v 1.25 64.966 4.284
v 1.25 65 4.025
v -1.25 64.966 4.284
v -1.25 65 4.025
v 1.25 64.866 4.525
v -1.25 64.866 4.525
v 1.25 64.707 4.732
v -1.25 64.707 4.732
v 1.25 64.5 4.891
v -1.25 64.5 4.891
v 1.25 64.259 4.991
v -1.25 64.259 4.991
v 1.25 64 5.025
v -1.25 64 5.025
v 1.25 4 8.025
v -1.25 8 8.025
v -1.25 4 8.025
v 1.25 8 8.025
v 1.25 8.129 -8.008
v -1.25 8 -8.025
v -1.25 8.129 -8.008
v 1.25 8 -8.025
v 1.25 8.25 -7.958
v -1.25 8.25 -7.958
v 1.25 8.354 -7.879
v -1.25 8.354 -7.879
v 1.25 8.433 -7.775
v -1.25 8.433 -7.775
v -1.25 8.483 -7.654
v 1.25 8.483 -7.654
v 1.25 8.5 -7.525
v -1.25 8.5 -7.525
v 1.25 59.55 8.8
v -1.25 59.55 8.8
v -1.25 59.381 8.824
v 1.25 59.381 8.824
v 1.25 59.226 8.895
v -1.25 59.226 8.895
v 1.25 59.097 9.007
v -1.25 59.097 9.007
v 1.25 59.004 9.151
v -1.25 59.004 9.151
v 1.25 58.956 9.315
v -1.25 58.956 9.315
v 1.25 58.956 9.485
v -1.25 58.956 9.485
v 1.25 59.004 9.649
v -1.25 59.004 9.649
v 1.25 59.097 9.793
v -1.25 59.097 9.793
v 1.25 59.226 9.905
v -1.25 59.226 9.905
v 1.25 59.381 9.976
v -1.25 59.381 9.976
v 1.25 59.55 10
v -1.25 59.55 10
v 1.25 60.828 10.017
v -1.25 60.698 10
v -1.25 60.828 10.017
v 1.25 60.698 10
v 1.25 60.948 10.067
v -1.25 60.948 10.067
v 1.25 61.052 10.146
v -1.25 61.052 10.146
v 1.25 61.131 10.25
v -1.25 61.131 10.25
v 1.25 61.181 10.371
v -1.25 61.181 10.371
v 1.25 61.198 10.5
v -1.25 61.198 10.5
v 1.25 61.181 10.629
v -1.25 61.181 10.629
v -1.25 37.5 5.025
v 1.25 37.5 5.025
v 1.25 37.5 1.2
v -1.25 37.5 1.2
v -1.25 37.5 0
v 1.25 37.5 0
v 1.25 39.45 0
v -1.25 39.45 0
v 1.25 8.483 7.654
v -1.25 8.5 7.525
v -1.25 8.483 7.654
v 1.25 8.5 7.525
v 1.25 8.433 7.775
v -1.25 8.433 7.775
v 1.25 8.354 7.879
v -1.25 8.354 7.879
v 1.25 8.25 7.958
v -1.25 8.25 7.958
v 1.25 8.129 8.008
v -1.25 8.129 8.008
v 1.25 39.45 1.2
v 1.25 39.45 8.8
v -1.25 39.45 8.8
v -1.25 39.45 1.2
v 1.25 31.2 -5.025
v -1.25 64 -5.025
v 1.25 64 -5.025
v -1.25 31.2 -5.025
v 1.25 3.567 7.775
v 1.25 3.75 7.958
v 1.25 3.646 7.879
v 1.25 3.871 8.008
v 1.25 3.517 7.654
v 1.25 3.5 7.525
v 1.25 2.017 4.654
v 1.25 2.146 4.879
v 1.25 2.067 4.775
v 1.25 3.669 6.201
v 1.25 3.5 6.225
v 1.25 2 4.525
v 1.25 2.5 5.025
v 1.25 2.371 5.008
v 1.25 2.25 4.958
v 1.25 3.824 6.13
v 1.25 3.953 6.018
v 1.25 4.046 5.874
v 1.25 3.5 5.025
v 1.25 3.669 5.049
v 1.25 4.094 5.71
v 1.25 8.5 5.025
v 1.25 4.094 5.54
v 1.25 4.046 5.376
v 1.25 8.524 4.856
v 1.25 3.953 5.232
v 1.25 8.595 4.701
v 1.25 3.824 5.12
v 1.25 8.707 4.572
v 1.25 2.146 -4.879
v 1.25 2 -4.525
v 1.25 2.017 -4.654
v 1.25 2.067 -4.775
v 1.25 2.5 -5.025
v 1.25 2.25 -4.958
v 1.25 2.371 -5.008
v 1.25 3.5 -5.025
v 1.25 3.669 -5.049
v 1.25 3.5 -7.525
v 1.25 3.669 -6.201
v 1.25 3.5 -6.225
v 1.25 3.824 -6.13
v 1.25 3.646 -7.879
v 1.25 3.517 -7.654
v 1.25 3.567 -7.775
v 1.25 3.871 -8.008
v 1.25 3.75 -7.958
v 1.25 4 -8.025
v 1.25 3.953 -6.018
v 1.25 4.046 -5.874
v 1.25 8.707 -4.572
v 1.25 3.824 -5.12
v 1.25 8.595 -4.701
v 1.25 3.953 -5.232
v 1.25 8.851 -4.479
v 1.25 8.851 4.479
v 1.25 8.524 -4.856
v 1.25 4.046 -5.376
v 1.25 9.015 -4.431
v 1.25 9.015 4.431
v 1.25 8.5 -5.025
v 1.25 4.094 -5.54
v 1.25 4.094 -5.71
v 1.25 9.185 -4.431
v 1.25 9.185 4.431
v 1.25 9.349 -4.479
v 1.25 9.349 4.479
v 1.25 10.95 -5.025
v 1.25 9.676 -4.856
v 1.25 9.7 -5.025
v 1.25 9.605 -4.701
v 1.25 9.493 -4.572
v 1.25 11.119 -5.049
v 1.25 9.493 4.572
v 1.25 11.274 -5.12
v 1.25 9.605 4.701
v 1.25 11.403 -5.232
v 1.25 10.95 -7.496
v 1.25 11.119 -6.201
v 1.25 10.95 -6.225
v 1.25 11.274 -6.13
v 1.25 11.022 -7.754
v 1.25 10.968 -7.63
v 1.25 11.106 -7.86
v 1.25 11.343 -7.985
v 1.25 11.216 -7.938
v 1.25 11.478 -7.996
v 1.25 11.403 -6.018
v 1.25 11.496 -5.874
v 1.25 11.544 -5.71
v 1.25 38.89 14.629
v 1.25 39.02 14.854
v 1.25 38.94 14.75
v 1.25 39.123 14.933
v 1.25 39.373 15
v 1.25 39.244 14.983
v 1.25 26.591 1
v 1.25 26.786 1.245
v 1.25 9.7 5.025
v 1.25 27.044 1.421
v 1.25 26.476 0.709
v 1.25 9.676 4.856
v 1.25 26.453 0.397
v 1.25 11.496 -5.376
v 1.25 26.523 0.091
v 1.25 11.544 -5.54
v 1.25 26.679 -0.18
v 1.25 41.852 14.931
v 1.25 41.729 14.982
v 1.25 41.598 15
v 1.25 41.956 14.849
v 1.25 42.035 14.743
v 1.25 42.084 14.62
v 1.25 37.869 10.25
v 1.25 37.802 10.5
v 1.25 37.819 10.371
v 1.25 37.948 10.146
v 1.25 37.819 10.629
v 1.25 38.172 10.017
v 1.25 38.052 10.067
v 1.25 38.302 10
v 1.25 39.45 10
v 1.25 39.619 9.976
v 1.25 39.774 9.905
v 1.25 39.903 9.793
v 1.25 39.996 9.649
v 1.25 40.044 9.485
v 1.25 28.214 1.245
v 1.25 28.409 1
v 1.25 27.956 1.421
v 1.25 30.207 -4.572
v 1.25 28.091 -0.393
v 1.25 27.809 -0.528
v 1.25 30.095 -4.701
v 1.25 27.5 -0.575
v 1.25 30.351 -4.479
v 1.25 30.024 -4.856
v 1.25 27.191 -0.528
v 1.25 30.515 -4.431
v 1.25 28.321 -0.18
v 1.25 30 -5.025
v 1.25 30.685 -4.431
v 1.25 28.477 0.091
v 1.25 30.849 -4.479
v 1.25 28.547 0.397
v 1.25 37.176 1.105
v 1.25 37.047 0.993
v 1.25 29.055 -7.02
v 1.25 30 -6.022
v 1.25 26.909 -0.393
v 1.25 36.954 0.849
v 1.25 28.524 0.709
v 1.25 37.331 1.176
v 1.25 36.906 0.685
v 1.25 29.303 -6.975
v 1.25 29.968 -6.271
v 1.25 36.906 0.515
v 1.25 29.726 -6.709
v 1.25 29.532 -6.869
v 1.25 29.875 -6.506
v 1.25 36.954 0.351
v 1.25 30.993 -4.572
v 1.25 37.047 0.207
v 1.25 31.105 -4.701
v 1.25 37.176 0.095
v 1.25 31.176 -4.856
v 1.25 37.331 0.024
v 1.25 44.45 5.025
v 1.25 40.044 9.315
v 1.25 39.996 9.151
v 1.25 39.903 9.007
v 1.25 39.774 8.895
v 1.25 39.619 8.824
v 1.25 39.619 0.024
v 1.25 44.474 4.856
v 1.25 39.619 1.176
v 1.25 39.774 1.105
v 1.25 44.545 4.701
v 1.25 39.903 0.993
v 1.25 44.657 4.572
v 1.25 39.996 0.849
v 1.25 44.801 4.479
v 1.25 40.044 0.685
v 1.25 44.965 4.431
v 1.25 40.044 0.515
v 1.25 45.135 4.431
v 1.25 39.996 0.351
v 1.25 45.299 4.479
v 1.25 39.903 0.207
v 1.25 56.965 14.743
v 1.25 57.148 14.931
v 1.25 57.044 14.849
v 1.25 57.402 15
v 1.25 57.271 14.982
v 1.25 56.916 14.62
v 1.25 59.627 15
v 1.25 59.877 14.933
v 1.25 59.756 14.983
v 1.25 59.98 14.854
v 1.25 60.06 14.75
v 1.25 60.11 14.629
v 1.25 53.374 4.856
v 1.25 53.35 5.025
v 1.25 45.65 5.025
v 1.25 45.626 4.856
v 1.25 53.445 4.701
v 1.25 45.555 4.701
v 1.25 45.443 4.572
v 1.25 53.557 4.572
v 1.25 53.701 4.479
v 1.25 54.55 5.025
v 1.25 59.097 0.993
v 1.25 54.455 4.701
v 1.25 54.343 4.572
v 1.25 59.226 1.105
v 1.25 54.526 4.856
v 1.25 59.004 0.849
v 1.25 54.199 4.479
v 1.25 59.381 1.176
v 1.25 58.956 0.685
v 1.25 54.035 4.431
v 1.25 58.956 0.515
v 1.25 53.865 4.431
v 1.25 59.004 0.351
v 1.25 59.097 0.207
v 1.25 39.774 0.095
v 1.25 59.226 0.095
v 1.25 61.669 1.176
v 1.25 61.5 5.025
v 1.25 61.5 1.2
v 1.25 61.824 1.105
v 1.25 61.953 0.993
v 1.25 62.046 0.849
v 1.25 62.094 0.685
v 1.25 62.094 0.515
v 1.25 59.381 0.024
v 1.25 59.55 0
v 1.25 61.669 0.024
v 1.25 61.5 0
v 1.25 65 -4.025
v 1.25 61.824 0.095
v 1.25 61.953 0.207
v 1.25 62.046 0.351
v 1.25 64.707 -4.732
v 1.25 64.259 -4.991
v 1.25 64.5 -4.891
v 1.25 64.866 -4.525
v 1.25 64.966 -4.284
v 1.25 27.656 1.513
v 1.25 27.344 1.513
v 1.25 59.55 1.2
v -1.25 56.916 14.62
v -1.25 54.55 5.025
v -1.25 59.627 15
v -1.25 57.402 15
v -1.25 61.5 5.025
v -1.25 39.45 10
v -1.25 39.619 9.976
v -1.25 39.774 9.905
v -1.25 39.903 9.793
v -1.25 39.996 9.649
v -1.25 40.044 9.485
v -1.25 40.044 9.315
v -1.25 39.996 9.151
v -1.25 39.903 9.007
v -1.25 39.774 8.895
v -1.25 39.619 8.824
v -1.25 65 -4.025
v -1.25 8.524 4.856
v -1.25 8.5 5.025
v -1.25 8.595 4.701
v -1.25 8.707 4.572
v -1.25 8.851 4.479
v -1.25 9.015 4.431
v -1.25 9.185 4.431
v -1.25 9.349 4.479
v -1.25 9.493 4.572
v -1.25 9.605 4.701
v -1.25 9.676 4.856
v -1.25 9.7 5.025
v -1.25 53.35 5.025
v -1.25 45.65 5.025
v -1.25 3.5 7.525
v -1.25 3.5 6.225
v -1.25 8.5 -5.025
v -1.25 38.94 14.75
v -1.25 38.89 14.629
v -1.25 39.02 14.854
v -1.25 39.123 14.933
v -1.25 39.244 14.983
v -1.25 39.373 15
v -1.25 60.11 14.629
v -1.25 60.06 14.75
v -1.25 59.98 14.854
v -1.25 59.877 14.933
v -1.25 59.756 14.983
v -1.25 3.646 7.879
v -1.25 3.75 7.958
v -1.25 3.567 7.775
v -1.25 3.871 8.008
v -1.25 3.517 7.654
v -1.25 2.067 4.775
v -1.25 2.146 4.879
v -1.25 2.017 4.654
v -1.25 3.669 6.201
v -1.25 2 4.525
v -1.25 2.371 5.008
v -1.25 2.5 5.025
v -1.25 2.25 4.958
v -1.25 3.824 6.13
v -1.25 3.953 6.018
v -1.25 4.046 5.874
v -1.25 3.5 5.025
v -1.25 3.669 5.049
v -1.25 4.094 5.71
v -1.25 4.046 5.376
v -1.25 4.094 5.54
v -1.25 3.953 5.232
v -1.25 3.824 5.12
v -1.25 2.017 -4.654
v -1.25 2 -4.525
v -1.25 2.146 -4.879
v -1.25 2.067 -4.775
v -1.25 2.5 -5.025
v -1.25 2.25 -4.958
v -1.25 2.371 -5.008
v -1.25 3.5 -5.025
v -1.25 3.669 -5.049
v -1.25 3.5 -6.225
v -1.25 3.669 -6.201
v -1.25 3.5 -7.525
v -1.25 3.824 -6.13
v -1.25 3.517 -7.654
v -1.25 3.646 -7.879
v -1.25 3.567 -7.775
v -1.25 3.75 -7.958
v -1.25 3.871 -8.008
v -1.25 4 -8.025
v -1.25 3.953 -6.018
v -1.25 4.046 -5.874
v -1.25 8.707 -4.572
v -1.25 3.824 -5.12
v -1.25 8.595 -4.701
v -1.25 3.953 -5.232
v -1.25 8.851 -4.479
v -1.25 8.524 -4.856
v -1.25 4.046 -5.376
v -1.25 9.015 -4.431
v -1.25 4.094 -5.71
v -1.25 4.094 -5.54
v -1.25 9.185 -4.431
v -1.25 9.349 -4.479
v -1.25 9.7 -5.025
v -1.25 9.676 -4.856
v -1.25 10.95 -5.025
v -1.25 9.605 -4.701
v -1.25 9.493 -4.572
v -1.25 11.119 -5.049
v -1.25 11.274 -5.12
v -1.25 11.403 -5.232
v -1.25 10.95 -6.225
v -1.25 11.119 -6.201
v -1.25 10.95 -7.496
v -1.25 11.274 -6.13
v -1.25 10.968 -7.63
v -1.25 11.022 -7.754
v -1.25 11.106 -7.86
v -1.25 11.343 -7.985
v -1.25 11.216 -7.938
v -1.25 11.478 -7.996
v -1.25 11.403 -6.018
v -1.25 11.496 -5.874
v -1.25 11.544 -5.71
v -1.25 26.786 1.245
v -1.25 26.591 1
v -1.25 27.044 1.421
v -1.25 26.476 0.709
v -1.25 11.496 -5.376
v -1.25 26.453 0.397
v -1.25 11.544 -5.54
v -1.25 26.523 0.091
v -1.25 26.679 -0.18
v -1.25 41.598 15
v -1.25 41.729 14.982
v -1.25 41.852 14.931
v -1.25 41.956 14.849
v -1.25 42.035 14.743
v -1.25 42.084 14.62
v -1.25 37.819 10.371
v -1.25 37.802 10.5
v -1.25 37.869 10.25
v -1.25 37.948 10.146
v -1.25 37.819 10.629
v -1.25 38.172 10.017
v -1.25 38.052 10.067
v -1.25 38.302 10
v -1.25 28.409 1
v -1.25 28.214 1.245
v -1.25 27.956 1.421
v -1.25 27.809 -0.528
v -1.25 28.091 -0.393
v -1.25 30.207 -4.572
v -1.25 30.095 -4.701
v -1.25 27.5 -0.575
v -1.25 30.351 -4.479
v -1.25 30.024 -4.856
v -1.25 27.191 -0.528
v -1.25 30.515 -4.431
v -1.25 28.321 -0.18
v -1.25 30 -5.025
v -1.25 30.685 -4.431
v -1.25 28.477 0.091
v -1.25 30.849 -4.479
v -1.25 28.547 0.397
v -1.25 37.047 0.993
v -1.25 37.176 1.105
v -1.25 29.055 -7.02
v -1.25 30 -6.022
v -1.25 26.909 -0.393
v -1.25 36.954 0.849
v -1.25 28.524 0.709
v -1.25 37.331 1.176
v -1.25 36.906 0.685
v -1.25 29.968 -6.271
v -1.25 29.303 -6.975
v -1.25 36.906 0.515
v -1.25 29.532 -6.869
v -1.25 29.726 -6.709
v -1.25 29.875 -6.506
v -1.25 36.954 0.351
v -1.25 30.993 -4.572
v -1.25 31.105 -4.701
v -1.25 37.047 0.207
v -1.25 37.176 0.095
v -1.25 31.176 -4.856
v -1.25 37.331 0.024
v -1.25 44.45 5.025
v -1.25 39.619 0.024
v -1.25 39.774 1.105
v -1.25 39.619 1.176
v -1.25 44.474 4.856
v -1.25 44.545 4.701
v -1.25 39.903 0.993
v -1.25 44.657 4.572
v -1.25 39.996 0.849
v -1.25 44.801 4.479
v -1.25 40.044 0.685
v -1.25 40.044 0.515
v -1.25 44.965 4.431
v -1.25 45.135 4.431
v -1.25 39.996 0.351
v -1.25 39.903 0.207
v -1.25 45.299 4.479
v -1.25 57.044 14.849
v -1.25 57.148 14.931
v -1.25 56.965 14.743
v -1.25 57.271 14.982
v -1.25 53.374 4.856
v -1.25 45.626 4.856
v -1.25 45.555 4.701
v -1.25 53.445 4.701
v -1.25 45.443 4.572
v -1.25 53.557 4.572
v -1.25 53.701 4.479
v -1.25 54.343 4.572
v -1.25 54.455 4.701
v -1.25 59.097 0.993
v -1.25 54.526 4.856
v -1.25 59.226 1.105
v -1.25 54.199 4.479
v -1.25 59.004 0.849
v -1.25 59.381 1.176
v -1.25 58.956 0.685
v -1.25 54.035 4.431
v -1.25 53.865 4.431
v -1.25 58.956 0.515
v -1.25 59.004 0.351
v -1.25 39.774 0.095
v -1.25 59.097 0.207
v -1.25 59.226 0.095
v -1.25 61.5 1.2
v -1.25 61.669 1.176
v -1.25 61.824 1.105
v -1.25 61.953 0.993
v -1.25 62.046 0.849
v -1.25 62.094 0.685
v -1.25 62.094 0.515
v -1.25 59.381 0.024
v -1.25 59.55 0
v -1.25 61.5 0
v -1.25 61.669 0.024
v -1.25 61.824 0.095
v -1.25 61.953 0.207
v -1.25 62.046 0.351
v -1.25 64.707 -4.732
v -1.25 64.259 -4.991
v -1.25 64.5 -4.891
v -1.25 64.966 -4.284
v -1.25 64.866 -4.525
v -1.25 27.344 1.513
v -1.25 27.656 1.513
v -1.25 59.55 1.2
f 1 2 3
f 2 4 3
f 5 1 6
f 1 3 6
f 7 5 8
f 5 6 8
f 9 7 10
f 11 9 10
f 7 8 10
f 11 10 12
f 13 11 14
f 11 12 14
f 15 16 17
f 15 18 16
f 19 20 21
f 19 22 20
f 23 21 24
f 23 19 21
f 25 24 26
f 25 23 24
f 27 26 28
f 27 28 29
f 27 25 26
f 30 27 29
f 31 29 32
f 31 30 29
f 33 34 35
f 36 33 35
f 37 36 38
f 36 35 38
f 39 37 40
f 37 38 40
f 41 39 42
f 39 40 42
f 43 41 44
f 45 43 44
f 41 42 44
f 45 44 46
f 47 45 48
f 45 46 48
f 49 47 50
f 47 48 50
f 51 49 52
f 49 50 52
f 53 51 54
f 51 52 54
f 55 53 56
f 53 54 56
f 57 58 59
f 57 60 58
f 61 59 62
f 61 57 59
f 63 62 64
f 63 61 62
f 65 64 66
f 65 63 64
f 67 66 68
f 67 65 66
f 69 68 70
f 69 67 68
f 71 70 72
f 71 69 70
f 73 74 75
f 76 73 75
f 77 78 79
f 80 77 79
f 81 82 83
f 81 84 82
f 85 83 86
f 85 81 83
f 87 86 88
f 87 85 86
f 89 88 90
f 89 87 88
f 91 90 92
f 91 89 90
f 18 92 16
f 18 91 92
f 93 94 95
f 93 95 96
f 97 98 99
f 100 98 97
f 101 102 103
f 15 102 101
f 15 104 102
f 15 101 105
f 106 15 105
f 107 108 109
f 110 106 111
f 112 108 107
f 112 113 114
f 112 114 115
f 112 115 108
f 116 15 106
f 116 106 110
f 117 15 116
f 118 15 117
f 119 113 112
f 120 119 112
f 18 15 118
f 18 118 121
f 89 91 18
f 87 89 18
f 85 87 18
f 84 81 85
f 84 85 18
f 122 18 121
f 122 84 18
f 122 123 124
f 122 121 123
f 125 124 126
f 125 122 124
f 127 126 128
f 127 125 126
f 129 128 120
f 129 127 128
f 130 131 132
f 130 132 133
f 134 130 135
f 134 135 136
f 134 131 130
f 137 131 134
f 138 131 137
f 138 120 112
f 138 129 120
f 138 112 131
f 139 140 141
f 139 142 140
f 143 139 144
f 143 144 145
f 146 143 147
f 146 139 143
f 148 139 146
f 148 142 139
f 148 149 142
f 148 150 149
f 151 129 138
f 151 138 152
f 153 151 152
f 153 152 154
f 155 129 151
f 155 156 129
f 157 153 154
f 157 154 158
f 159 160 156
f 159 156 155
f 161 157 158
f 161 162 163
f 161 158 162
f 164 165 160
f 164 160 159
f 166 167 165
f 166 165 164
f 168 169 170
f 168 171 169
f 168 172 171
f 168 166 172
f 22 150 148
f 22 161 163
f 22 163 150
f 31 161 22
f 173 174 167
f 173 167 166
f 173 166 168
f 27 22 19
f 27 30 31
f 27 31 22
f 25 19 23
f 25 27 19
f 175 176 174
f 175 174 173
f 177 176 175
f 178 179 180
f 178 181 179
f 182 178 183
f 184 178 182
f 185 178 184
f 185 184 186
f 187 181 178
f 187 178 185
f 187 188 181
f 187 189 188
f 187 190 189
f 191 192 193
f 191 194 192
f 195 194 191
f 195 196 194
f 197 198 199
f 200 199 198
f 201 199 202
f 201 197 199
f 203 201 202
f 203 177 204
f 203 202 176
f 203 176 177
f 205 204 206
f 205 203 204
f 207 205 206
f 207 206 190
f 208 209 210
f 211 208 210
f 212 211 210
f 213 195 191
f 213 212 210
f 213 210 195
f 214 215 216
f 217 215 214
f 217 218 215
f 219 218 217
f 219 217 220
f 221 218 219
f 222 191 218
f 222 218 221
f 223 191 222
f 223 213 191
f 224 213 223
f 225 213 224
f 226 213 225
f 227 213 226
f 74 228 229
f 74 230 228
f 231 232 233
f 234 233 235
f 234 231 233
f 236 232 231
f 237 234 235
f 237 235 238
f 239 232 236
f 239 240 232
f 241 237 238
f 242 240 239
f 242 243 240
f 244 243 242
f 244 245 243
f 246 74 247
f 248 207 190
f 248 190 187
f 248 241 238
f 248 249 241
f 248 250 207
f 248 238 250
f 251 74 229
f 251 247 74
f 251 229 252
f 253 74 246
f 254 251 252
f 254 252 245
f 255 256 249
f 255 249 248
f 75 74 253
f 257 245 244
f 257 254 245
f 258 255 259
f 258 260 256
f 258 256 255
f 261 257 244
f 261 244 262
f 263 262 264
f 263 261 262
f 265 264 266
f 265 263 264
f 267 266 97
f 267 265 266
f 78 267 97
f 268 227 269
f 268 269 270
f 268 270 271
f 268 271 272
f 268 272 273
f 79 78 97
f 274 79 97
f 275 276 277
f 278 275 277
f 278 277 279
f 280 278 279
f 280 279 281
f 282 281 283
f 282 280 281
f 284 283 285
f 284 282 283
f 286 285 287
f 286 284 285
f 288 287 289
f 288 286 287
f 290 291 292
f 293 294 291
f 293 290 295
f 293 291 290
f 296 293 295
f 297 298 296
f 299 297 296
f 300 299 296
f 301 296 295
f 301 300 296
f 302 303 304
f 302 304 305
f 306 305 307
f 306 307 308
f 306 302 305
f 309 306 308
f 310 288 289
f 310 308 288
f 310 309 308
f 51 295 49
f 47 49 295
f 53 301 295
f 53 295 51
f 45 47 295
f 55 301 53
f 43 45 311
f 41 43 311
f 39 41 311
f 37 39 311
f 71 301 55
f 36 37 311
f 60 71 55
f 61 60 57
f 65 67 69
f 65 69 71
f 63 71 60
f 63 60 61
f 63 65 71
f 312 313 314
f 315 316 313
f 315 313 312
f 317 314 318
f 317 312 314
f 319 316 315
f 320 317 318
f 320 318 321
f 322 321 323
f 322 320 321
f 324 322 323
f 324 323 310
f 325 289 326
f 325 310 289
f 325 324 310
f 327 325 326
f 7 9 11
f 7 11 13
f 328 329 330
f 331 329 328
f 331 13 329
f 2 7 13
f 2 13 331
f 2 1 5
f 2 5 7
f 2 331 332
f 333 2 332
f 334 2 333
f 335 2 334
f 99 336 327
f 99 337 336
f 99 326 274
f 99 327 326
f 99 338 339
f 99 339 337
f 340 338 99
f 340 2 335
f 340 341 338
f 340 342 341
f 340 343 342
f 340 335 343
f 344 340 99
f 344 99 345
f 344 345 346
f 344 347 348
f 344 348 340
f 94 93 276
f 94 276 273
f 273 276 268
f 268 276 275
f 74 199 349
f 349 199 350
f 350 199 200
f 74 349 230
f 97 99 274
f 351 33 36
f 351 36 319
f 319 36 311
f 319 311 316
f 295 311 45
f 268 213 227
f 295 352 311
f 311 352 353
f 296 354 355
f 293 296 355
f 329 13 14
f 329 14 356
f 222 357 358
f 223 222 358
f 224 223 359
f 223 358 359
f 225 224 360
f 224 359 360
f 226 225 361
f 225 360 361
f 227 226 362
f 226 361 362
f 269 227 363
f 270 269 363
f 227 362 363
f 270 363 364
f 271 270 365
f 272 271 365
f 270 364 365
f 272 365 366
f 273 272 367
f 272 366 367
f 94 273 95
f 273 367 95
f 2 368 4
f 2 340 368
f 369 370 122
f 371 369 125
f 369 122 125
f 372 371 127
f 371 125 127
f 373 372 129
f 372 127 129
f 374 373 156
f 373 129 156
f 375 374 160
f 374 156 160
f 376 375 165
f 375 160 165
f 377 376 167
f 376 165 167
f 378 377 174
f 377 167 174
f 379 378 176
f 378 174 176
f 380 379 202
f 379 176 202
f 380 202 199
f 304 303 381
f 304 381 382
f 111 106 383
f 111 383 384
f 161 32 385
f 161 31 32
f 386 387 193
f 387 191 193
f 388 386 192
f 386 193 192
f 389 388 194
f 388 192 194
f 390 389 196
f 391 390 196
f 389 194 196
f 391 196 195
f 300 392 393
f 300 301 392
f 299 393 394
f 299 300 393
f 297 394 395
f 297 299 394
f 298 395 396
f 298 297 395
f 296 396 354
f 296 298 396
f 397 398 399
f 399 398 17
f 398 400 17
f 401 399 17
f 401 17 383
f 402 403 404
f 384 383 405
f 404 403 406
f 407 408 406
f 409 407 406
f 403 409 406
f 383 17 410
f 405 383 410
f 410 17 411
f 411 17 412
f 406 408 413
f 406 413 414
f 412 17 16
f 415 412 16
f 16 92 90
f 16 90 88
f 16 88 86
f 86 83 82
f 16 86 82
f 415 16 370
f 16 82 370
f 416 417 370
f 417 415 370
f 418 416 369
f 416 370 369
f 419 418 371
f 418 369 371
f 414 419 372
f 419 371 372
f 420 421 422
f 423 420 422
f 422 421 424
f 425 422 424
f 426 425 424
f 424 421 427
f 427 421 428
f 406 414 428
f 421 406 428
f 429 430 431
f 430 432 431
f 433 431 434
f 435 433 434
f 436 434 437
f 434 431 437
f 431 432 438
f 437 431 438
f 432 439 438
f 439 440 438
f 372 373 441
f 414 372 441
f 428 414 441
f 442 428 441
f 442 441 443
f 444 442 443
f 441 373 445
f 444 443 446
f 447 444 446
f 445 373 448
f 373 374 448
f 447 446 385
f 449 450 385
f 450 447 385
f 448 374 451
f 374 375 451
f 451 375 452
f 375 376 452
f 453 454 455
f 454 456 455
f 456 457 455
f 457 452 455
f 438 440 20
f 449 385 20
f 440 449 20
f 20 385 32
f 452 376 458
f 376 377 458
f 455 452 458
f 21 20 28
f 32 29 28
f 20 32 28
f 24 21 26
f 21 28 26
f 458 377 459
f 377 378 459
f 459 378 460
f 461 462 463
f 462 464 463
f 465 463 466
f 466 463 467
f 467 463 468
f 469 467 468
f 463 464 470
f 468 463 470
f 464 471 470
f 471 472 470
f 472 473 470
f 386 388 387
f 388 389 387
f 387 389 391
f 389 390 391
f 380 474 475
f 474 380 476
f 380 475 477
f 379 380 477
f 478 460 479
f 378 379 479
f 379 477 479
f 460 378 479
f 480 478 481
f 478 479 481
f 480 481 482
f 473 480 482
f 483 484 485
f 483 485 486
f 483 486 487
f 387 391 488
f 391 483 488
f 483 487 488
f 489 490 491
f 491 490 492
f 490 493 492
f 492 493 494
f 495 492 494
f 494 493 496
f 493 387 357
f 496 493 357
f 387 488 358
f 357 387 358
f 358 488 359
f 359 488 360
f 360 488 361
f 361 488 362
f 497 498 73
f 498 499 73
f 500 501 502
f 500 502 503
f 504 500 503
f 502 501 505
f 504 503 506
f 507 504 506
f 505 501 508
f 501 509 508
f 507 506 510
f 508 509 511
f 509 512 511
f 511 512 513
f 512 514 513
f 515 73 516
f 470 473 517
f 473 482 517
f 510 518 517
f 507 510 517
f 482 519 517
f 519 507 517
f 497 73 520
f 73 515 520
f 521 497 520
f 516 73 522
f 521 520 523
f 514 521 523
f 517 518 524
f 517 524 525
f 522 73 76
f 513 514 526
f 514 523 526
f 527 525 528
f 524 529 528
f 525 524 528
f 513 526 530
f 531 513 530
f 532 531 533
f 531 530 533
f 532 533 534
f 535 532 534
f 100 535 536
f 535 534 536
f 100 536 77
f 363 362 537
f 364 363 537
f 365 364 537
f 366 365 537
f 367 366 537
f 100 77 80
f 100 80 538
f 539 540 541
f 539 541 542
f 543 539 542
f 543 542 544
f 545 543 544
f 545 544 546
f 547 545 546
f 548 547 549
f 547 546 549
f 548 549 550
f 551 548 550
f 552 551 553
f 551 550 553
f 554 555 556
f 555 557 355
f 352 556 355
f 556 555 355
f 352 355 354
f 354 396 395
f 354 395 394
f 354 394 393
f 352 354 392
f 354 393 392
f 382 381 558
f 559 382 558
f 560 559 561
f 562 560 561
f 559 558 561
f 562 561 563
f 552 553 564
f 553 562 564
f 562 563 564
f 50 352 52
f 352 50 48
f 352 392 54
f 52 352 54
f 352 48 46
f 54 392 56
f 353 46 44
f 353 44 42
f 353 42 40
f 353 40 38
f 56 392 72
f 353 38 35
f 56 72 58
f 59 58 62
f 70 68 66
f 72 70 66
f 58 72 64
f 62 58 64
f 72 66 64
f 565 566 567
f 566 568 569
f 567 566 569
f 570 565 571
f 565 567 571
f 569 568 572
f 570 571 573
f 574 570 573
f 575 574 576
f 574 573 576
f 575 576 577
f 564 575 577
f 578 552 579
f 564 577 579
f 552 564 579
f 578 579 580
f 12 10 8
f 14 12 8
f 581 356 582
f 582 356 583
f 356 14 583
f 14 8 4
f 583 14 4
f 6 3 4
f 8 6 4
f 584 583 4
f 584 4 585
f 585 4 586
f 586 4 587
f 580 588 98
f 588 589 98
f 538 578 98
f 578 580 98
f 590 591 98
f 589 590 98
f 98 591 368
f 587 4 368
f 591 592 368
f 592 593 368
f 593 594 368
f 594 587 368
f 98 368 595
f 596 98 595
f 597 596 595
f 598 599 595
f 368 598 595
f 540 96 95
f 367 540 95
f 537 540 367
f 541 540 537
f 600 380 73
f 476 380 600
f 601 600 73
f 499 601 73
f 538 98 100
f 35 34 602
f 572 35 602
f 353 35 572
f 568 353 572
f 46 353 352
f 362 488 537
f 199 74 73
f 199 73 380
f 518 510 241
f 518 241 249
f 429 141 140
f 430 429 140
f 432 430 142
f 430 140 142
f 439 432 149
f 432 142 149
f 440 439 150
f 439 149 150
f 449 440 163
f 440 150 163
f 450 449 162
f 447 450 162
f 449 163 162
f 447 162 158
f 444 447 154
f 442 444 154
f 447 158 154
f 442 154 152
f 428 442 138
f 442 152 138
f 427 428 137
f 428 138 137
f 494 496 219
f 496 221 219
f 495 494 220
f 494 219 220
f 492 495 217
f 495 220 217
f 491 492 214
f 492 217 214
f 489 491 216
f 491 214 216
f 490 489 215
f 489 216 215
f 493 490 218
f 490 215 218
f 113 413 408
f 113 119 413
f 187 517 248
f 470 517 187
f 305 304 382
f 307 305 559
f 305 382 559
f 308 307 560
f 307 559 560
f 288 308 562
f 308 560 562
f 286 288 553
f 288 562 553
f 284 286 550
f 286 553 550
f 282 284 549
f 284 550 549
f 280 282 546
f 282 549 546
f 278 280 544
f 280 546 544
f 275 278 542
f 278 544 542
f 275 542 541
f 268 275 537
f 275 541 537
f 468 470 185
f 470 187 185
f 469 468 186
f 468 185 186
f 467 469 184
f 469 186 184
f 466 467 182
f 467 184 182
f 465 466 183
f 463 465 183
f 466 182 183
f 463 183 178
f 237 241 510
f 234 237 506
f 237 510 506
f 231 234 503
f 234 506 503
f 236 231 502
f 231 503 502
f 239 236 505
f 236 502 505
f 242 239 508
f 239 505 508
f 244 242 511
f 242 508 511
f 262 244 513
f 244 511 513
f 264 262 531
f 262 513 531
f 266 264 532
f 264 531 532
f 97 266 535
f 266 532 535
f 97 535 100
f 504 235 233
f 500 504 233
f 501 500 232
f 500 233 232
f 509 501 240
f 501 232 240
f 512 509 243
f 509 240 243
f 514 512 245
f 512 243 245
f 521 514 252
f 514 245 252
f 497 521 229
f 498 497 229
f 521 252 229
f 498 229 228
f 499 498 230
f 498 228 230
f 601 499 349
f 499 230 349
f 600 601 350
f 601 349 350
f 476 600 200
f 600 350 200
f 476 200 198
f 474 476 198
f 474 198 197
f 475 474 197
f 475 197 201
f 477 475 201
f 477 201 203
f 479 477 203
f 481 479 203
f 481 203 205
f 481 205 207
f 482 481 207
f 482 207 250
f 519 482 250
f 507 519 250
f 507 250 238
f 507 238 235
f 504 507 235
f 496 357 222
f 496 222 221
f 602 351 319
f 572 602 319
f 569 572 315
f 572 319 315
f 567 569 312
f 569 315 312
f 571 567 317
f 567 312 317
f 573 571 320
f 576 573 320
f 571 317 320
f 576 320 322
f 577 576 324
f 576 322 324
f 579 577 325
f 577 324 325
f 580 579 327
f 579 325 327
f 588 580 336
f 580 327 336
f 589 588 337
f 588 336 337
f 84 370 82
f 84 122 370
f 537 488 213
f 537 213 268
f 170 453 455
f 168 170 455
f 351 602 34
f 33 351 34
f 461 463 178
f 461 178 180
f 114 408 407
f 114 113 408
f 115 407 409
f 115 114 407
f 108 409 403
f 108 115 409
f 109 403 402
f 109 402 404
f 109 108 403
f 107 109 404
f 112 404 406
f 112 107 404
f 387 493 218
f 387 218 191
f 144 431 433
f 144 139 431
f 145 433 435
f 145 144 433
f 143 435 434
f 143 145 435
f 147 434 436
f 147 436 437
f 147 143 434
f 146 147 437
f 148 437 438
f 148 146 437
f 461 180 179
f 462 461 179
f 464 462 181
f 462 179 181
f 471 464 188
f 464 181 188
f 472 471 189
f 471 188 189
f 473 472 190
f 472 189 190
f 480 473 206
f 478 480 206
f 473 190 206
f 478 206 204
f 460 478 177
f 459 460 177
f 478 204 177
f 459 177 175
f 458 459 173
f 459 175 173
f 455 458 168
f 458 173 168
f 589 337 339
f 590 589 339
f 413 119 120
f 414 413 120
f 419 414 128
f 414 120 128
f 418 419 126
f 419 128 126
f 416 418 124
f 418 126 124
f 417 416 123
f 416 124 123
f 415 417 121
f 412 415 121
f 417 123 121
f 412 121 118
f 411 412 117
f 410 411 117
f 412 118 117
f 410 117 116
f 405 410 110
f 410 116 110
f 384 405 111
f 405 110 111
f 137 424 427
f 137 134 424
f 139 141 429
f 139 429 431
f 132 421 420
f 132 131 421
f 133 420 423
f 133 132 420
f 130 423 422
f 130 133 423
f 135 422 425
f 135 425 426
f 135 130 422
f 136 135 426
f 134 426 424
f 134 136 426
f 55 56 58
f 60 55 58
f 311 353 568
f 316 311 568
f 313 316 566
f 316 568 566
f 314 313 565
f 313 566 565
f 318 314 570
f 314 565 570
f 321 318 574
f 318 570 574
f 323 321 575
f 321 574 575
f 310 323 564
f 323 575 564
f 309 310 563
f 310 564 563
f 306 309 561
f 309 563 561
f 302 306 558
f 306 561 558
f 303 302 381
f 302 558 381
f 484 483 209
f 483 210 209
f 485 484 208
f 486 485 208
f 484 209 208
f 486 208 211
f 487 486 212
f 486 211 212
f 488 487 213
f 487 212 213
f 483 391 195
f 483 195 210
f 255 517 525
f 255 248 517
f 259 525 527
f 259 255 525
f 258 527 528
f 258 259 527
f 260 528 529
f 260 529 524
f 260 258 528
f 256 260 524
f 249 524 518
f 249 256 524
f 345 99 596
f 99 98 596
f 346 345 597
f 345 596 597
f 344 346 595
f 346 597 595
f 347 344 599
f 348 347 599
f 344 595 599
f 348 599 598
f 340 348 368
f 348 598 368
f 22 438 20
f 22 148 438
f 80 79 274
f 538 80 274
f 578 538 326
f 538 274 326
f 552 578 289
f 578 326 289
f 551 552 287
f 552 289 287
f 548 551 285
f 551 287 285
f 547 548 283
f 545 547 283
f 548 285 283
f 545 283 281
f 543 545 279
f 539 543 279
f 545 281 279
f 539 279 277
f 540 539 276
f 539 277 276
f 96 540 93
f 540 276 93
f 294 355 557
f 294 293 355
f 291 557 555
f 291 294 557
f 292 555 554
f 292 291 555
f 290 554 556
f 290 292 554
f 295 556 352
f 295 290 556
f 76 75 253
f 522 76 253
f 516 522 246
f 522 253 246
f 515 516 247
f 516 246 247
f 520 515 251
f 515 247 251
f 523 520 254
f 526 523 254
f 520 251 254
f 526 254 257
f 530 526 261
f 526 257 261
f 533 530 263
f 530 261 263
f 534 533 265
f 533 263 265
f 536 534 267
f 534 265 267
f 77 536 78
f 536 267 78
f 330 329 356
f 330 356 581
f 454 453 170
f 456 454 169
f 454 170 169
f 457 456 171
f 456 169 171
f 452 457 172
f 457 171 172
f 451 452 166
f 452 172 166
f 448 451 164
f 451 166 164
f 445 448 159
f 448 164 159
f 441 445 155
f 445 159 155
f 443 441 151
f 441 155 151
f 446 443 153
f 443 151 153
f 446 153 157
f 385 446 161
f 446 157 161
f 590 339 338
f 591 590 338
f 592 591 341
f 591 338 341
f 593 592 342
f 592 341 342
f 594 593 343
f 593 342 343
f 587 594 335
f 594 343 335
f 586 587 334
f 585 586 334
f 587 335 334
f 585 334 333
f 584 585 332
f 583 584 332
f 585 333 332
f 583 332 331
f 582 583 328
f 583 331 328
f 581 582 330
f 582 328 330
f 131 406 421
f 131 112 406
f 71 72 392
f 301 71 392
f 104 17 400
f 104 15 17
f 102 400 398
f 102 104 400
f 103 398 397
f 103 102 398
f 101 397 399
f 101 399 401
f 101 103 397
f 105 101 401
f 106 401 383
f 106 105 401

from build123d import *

# Parameters (mm, degrees)
EXTRUDE_1_DEPTH     = 1.25
EXTRUDE_2_DEPTH     = 2.5
SKETCH_3_R          = 0.6
CUT_EXTRUDE_1_DEPTH = 3.5
FILLET_1_R          = 0.5
SKETCH_5_W          = 5.025
SKETCH_5_H          = 1.95
CUT_EXTRUDE_2_DEPTH = 3.5
SKETCH_6_R          = 0.6
CUT_EXTRUDE_3_DEPTH = 3.5
CUT_EXTRUDE_4_DEPTH = 3.5
SKETCH_8_R          = 0.6
CUT_EXTRUDE_5_DEPTH = 3.5
FILLET_2_R          = 1
EXTRUDE_3_DEPTH     = 2.5
SKETCH_10_R         = 0.6
CUT_EXTRUDE_6_DEPTH = 3.5
FILLET_3_R          = 0.5
SKETCH_11_R         = 1.05
CUT_EXTRUDE_7_DEPTH = 3.5


with BuildPart() as part:
    # 草图2 → 凸台-拉伸1 (new body, symmetric)
    with BuildSketch(Plane(origin=(0, 0, 0), x_dir=(0, 0, -1), z_dir=(1, 0, 0))):
        Polygon((-5.025, 65), (-5.025, 8.5), (-8.025, 8.5), (-8.025, 3.5), (-5.025, 3.5), (-5.025, 2), (5.025, 2), (5.025, 3.5), (8.025, 3.5), (8.025, 8.5), (5.025, 8.5), (5.025, 65), align=None)
    extrude(amount=EXTRUDE_1_DEPTH, both=True)

    # 草图4 → 凸台-拉伸2 (add)
    with BuildSketch(Plane.ZY.offset(1.25)):
        Polygon((-5.025, 65), (-8.025, 10.95), (-5.025, 10.95), align=None)
    extrude(amount=-EXTRUDE_2_DEPTH)

    # 草图3 → 切除-拉伸1 (cut, through all)
    with BuildSketch(Plane(origin=(1.25, 0, 0), x_dir=(0, 0, -1), z_dir=(1, 0, 0))):
        with Locations((-5.025, 9.1)):
            Circle(SKETCH_3_R)
        with Locations((-5.625, 3.5)):
            Circle(SKETCH_3_R)
        with Locations((5.025, 9.1)):
            Circle(SKETCH_3_R)
        with Locations((5.625, 3.5)):
            Circle(SKETCH_3_R)
        with Locations((5.625, 10.95)):
            Circle(SKETCH_3_R)
    extrude(amount=-CUT_EXTRUDE_1_DEPTH, mode=Mode.SUBTRACT)

    # 圆角1
    fillet_1_edges = [part.edges().sort_by_distance(p)[0] for p in [
        (0, 8.5, -8.025),
        (0, 3.5, -8.025),
        (0, 2, -5.025),
        (0, 2, 5.025),
        (0, 3.5, 8.025),
        (0, 8.5, 8.025),
        (0, 10.95, -8.025),
    ]]
    fillet(fillet_1_edges, radius=FILLET_1_R)

    # 草图5 → 切除-拉伸2 (cut, through all)
    with BuildSketch(Plane(origin=(1.25, 0, 0), x_dir=(0, 0, -1), z_dir=(1, 0, 0))):
        with Locations((-2.5125, 38.475)):
            Rectangle(SKETCH_5_W, SKETCH_5_H)
        with Locations((-2.5125, 60.525)):
            Rectangle(SKETCH_5_W, SKETCH_5_H)
    extrude(amount=-CUT_EXTRUDE_2_DEPTH, mode=Mode.SUBTRACT)

    # 草图6 → 切除-拉伸3 (cut, through all)
    with BuildSketch(Plane(origin=(1.25, 0, 0), x_dir=(0, 0, -1), z_dir=(1, 0, 0))):
        with Locations((-0.6, 61.5)):
            Circle(SKETCH_6_R)
        with Locations((-0.6, 59.55)):
            Circle(SKETCH_6_R)
        with Locations((-0.6, 39.45)):
            Circle(SKETCH_6_R)
        with Locations((-0.6, 37.5)):
            Circle(SKETCH_6_R)
    extrude(amount=-CUT_EXTRUDE_3_DEPTH, mode=Mode.SUBTRACT)

    # 草图7 → 切除-拉伸4 (cut, through all)
    with BuildSketch(Plane.ZY.offset(1.25)):
        Polygon((-5.025, 65), (-5.025, 30), (-6.967645698, 30), align=None)
    extrude(amount=-CUT_EXTRUDE_4_DEPTH, mode=Mode.SUBTRACT)

    # 草图8 → 切除-拉伸5 (cut, through all)
    with BuildSketch(Plane.ZY.offset(1.25)):
        with Locations((-5.025, 30.6)):
            Circle(SKETCH_8_R)
    extrude(amount=-CUT_EXTRUDE_5_DEPTH, mode=Mode.SUBTRACT)

    # 圆角2
    fillet_2_edges = [part.edges().sort_by_distance(p)[0] for p in [
        (0, 65, -5.025),
        (0, 30, -6.967645698),
        (0, 65, 5.025),
    ]]
    fillet(fillet_2_edges, radius=FILLET_2_R)

    # 草图9 → 凸台-拉伸3 (add)
    with BuildSketch(Plane.ZY.offset(1.25)):
        Polygon((5.025, 59.55), (10, 59.55), (10, 61.35), (15, 60.010254038), (15, 57.010254038), (5.025, 54.55), align=None)
        Polygon((15, 41.989745962), (5.025, 44.45), (5.025, 39.45), (10, 39.45), (10, 37.65), (15, 38.989745962), align=None)
    extrude(amount=-EXTRUDE_3_DEPTH)

    # 草图10 → 切除-拉伸6 (cut, through all)
    with BuildSketch(Plane.ZY.offset(1.25)):
        with Locations((5.025, 53.95)):
            Circle(SKETCH_10_R)
        with Locations((5.025, 45.05)):
            Circle(SKETCH_10_R)
        with Locations((9.4, 59.55)):
            Circle(SKETCH_10_R)
        with Locations((9.4, 39.45)):
            Circle(SKETCH_10_R)
    extrude(amount=-CUT_EXTRUDE_6_DEPTH, mode=Mode.SUBTRACT)

    # 圆角3
    fillet_3_edges = [part.edges().sort_by_distance(p)[0] for p in [
        (0, 61.35, 10),
        (0, 60.010254038, 15),
        (0, 57.010254038, 15),
        (0, 41.989745962, 15),
        (0, 38.989745962, 15),
        (0, 37.65, 10),
    ]]
    fillet(fillet_3_edges, radius=FILLET_3_R)

    # 草图11 → 切除-拉伸7 (cut, through all)
    with BuildSketch(Plane(origin=(1.25, 0, 0), x_dir=(0, 0, -1), z_dir=(1, 0, 0))):
        with Locations((-0.475, 27.5)):
            Circle(SKETCH_11_R)
    extrude(amount=-CUT_EXTRUDE_7_DEPTH, mode=Mode.SUBTRACT)


solid = part.part
